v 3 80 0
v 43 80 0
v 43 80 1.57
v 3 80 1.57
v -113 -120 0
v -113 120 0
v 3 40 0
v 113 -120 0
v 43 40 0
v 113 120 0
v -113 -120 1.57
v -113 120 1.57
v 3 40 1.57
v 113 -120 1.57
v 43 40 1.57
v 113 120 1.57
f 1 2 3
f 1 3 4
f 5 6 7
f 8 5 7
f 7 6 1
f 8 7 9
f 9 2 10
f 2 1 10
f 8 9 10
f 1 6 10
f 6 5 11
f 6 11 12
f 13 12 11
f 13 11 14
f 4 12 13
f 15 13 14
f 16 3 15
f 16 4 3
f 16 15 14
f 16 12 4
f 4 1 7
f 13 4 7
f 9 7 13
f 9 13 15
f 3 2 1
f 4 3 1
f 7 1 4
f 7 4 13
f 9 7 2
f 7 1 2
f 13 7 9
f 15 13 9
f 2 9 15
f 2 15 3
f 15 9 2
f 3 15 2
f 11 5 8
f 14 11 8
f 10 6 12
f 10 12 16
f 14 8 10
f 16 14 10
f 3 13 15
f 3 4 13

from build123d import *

# Parameters (mm, degrees)
SKETCH1_W              = 226
SKETCH1_H              = 240
BOSS_EXTRUDE1_DEPTH    = 1.57
SPLIT1_SURFACE_1_BACK  = 330.664
SPLIT1_SURFACE_1_DEPTH = 661.328
SPLIT1_SURFACE_2_BACK  = 330.664
SPLIT1_SURFACE_2_DEPTH = 661.328


with BuildPart() as part:
    # Sketch1 → Boss-Extrude1 (new body)
    with BuildSketch(Plane.XY):
        Rectangle(SKETCH1_W, SKETCH1_H)
    extrude(amount=BOSS_EXTRUDE1_DEPTH)


with BuildPart() as body_2:
    # Split1: the piece behind the surface
    add(part.part)
    # Split1 surface: a surface, the sketch's curves swept straight by 661.328 mm
    with BuildLine(Plane.XY.offset(1.57).offset(-SPLIT1_SURFACE_1_BACK), mode=Mode.PRIVATE) as split1_surface_1_path:
        Line((3, 40), (43, 40))
        Line((43, 40), (43, 80))
        Line((43, 80), (3, 80))
        Line((3, 80), (3, 40))
    split1_surface_1 = Shell.extrude(split1_surface_1_path.wire(), (0 * SPLIT1_SURFACE_1_DEPTH, 0 * SPLIT1_SURFACE_1_DEPTH, 1 * SPLIT1_SURFACE_1_DEPTH))
    split(bisect_by=split1_surface_1, keep=Keep.BOTTOM)


with BuildPart() as part_1:
    add(part.part)

    # Split1: split by a surface, the side it looks to stays
    # Split1 surface: a surface, the sketch's curves swept straight by 661.328 mm
    with BuildLine(Plane.XY.offset(1.57).offset(-SPLIT1_SURFACE_2_BACK), mode=Mode.PRIVATE) as split1_surface_2_path:
        Line((3, 40), (43, 40))
        Line((43, 40), (43, 80))
        Line((43, 80), (3, 80))
        Line((3, 80), (3, 40))
    split1_surface_2 = Shell.extrude(split1_surface_2_path.wire(), (0 * SPLIT1_SURFACE_2_DEPTH, 0 * SPLIT1_SURFACE_2_DEPTH, 1 * SPLIT1_SURFACE_2_DEPTH))
    split(bisect_by=split1_surface_2, keep=Keep.TOP)


solid = Compound([body_2.part, part_1.part])
